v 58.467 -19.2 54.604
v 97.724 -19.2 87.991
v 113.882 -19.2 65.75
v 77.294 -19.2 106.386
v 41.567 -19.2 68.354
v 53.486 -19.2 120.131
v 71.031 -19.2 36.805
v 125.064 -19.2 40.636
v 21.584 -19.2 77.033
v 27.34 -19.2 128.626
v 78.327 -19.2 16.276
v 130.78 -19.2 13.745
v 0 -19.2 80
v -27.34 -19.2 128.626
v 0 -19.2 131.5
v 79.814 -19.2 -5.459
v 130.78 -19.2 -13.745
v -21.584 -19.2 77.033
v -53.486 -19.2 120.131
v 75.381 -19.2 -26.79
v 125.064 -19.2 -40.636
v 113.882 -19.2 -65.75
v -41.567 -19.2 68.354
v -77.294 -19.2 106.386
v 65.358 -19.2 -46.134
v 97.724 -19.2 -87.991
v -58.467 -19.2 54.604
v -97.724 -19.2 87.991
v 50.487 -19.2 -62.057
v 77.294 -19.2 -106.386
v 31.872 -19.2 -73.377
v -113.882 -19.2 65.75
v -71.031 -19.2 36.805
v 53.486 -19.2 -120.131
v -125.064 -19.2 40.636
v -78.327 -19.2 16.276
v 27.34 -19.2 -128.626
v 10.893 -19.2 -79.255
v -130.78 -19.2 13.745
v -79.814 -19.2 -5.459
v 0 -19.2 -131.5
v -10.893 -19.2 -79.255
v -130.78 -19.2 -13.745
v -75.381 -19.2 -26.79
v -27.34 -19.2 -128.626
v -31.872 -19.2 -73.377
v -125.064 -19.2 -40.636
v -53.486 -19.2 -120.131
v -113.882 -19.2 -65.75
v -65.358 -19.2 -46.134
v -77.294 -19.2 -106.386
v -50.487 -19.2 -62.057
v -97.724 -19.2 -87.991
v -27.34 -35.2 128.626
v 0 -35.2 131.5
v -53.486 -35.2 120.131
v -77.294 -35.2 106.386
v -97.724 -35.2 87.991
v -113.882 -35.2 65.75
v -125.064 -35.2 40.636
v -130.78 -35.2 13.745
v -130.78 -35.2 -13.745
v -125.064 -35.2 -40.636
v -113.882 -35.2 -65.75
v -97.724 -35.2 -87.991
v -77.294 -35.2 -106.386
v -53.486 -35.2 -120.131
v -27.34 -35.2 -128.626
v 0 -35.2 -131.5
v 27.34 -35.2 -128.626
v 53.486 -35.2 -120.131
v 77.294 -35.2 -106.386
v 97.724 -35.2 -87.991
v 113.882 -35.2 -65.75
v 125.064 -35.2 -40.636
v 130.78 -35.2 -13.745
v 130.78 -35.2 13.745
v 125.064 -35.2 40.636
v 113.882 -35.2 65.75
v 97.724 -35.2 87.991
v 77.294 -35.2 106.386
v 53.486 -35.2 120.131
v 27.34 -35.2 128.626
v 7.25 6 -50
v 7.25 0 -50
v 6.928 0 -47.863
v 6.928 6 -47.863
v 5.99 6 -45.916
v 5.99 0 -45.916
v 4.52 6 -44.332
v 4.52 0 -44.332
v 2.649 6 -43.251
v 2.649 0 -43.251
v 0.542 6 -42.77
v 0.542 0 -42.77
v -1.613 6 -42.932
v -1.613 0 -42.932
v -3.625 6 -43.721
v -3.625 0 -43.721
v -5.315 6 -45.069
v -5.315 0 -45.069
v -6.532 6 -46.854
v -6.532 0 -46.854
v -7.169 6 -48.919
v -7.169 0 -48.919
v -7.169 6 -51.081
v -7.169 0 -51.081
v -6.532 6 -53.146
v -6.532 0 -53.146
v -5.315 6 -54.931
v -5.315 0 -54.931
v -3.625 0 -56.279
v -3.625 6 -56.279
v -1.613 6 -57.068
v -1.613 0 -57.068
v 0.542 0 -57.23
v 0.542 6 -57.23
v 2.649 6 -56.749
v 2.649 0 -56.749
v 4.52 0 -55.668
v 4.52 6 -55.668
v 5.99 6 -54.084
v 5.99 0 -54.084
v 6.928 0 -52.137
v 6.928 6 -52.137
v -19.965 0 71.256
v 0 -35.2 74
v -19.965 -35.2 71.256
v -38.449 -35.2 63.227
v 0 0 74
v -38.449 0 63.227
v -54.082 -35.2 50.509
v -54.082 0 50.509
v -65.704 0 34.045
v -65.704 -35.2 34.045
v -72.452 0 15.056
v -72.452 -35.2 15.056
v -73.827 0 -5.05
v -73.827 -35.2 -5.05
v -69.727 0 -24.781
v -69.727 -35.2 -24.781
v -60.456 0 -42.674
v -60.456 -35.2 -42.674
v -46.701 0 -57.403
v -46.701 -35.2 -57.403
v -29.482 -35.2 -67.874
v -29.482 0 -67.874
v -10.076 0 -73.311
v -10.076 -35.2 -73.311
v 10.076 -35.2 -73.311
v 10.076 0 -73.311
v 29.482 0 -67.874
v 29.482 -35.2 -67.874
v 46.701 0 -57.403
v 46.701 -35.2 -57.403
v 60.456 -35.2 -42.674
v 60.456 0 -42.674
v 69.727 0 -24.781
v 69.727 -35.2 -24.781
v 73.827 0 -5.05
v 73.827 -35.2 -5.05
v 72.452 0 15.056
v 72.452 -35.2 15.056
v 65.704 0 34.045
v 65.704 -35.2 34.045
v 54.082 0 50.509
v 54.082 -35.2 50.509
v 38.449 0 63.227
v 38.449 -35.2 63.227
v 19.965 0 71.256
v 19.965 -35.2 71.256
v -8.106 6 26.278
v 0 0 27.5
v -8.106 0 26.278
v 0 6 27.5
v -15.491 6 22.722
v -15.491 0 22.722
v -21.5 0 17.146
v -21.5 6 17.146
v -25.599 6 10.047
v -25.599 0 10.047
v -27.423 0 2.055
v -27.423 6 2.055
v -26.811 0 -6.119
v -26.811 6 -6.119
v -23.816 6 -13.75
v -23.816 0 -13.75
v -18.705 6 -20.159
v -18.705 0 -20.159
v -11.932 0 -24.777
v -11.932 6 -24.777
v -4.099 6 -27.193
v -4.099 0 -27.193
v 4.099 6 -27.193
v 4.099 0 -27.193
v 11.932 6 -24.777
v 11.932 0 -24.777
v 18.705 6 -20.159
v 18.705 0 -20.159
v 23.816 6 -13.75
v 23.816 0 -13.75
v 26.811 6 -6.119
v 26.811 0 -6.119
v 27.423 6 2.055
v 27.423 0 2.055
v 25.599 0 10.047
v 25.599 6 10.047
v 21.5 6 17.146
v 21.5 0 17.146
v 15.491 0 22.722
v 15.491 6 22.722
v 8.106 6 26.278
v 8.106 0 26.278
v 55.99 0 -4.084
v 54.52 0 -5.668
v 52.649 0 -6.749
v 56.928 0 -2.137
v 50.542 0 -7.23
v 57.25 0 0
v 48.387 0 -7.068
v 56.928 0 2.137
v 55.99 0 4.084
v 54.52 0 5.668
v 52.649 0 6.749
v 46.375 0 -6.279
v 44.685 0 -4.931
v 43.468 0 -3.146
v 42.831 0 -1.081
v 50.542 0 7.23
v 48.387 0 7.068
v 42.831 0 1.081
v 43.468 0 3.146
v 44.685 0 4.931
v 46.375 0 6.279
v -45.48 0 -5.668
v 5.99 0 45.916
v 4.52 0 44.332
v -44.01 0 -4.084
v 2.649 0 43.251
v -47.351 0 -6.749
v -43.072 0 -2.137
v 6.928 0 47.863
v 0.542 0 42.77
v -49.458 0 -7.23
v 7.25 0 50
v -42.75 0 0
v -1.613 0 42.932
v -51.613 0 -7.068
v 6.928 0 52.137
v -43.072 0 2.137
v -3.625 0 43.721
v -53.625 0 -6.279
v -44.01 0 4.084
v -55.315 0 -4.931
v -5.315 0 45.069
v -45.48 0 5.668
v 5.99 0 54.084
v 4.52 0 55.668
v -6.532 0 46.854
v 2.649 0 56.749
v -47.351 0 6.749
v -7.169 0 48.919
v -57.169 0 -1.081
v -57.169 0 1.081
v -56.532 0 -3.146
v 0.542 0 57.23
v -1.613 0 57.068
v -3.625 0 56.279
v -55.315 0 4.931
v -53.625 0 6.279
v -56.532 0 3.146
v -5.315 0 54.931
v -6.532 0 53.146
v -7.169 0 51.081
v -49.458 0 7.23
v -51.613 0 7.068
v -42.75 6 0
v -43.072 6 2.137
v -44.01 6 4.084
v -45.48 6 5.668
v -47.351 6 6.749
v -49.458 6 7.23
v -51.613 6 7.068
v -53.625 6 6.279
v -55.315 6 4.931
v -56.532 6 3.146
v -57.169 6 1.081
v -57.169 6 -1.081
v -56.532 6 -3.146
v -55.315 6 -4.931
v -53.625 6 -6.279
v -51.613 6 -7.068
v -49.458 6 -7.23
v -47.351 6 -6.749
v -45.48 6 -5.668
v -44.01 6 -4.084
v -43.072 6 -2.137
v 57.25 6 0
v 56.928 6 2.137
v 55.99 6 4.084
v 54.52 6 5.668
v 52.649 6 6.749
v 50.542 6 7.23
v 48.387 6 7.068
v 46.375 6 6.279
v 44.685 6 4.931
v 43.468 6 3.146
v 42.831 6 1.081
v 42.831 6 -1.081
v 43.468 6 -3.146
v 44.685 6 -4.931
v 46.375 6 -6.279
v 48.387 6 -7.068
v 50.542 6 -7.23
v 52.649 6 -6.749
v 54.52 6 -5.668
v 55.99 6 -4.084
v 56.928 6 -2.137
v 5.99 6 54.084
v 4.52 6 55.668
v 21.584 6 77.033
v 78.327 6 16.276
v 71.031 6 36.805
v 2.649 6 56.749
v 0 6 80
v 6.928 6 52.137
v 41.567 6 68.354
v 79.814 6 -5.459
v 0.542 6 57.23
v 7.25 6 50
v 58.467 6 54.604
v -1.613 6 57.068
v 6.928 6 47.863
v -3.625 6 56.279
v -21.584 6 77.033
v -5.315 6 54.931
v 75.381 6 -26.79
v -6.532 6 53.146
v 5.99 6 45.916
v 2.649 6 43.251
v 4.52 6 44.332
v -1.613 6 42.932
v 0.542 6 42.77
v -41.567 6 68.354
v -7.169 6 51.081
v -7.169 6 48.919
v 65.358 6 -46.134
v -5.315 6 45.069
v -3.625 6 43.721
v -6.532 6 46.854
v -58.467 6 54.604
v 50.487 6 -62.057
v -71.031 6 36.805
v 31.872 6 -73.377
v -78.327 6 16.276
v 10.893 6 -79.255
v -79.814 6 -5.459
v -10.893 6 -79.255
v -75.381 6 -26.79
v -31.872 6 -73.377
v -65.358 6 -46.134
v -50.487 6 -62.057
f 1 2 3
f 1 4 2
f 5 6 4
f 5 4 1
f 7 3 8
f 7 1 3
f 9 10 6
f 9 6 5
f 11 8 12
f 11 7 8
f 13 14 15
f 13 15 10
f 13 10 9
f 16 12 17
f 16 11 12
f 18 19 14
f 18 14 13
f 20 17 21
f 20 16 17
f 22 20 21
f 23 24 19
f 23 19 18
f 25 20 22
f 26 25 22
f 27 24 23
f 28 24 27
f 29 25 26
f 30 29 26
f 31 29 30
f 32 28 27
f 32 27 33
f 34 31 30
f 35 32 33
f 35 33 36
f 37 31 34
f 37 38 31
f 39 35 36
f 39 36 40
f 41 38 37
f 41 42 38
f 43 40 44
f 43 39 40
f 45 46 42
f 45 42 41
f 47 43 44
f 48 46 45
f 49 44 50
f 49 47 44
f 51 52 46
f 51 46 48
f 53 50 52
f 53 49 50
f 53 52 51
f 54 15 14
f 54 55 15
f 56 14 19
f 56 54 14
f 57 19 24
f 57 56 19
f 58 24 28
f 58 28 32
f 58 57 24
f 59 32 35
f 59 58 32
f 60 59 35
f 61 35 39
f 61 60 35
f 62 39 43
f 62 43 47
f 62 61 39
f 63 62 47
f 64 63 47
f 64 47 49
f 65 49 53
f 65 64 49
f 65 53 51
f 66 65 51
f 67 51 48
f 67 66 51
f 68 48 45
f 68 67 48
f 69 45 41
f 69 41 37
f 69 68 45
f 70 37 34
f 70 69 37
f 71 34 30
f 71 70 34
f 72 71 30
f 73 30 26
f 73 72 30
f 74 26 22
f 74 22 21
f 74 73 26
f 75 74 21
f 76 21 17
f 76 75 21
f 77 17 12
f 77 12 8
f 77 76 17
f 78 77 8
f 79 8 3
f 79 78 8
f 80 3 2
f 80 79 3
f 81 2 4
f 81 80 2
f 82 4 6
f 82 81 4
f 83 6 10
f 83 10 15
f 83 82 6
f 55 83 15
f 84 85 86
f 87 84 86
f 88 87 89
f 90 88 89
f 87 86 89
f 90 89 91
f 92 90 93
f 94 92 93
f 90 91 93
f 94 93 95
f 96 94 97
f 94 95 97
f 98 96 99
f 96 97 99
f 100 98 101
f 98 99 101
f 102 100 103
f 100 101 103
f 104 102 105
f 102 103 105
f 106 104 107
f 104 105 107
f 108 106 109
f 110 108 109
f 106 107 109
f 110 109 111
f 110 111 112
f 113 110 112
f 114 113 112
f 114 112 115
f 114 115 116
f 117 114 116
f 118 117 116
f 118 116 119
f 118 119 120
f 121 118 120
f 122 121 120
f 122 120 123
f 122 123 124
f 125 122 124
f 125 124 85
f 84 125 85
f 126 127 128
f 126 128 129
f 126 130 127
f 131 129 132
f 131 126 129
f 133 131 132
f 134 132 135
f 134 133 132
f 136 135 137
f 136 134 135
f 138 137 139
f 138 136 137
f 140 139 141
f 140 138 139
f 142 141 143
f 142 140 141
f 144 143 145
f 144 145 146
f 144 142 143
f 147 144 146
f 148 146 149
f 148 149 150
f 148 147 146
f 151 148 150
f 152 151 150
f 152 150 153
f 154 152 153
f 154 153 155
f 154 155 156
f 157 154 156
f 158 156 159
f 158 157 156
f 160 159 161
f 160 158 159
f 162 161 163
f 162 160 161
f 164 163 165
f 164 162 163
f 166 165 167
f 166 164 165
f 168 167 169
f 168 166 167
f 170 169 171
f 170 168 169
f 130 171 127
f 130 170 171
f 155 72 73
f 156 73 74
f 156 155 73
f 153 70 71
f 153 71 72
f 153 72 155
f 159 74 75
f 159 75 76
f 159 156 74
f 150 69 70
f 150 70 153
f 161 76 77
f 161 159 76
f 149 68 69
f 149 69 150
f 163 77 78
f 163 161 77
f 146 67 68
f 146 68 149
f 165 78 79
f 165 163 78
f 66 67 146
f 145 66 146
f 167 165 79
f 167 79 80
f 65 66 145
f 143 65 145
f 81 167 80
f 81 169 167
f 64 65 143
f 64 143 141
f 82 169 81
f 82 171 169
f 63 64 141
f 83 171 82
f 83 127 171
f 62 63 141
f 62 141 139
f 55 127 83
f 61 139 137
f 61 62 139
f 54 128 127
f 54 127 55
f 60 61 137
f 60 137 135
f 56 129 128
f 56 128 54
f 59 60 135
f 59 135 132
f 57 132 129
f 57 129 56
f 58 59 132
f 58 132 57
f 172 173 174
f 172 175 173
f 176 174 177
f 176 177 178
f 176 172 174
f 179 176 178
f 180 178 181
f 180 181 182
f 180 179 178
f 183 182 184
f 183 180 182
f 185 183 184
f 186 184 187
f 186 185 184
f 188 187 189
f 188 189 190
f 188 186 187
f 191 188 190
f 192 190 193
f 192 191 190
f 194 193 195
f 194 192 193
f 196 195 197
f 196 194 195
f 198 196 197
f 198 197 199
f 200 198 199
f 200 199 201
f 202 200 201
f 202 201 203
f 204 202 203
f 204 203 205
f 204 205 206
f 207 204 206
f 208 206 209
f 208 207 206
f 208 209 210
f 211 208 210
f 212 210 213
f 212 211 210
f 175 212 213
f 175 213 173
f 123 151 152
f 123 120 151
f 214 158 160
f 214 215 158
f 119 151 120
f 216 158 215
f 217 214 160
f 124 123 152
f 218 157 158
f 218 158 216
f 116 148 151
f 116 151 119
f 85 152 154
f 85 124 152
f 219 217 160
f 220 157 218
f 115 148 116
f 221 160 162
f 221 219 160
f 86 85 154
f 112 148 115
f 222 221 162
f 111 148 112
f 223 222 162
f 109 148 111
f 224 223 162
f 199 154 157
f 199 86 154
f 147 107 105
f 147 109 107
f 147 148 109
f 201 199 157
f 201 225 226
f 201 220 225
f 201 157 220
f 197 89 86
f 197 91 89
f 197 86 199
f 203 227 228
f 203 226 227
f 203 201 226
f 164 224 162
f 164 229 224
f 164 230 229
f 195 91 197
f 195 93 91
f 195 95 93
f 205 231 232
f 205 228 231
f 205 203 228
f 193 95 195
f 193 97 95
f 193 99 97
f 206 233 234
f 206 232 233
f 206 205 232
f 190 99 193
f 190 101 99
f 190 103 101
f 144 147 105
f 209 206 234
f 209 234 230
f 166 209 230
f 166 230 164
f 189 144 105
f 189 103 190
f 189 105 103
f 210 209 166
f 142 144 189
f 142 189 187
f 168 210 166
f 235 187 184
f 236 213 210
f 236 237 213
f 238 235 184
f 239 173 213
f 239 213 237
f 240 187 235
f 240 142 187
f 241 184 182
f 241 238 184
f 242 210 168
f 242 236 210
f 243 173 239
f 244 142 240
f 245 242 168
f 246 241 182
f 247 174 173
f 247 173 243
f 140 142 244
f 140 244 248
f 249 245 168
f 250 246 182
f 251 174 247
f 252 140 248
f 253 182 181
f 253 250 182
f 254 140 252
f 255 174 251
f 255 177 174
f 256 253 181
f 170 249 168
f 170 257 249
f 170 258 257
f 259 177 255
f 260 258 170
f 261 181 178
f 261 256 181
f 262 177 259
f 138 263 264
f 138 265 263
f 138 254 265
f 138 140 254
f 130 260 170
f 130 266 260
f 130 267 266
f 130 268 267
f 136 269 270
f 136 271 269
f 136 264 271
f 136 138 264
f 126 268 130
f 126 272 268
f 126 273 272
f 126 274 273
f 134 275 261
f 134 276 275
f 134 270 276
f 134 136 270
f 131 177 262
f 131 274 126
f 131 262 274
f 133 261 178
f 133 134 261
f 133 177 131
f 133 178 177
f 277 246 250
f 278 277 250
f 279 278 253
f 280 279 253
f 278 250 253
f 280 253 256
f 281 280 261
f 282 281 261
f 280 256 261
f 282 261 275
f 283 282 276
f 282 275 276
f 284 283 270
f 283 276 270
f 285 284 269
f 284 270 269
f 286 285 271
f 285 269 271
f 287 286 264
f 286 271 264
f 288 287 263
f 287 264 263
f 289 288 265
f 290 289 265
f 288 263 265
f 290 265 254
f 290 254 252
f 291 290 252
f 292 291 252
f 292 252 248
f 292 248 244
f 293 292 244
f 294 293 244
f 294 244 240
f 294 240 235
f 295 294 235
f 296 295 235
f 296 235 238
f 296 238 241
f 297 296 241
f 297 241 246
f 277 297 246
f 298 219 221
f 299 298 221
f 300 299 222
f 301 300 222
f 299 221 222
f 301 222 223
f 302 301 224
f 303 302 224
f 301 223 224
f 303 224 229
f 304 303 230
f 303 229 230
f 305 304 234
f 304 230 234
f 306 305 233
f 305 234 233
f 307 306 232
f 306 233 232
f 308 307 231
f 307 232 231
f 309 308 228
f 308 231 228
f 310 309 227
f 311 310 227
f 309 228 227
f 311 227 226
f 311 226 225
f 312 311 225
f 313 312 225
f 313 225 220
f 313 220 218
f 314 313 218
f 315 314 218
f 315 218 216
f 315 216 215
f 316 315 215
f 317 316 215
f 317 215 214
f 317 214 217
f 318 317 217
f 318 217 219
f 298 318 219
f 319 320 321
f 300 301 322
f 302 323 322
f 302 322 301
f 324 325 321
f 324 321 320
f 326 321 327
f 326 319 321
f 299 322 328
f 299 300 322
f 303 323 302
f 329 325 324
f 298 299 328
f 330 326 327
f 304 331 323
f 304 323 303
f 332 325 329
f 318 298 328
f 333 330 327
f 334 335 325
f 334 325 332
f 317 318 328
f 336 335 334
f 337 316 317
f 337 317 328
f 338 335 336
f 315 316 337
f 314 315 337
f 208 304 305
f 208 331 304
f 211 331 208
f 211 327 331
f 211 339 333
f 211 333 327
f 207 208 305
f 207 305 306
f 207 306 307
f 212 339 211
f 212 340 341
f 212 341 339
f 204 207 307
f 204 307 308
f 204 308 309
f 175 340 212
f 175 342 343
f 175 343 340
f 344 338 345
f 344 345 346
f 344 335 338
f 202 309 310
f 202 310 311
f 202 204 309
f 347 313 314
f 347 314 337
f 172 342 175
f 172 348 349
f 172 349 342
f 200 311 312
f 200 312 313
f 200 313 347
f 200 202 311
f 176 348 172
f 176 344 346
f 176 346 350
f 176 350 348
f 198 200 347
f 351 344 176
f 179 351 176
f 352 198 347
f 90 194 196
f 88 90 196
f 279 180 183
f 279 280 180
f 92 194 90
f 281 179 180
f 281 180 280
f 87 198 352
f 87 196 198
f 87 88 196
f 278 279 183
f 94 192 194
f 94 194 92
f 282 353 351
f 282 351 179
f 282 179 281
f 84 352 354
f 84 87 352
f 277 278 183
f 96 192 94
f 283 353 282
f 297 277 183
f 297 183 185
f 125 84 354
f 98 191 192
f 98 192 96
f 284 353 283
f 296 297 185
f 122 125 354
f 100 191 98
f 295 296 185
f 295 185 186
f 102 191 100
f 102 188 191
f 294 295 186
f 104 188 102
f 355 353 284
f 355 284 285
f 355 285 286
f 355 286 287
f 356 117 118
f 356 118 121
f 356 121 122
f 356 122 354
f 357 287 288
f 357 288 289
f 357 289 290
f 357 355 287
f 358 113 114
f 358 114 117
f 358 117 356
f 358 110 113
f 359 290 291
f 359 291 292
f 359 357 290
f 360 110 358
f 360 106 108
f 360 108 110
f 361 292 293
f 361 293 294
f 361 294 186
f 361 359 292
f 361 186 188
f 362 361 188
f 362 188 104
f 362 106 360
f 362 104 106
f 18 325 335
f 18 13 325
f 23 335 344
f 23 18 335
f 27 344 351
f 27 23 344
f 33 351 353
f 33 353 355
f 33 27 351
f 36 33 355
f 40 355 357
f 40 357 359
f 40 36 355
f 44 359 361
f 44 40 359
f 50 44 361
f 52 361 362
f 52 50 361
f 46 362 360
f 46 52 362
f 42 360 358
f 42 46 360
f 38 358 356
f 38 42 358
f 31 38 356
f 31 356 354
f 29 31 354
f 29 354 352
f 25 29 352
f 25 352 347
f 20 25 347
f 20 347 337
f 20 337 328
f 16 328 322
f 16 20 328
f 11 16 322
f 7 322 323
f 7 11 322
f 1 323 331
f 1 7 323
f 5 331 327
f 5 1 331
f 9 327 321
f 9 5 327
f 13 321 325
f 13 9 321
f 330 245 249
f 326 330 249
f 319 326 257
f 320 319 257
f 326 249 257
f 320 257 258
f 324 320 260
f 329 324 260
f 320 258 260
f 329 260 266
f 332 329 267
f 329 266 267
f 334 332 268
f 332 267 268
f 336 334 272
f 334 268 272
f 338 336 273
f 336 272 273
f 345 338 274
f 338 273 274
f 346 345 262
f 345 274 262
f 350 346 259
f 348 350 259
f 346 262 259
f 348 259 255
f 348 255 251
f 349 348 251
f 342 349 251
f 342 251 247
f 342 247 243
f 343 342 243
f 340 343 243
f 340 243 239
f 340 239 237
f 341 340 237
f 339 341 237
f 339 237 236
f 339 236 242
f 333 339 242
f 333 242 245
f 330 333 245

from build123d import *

# Parameters (mm, degrees)
F3_D = 14.5


with BuildPart() as f1:
    # F0 (on Right) → F1 (revolve)
    with BuildSketch(Plane.YZ):
        Polygon((0, 74), (0, 27.5), (6, 27.5), (6, 80), (-19.2, 80), (-19.2, 131.5), (-35.2, 131.5), (-35.2, 74), align=None)
    revolve(axis=Axis((0, -66.1122447776, 0), (0, -1, 0)))

    # F3 (through all)
    with Locations(Plane(origin=(0, 6, 0), x_dir=(-1, 0, 0), z_dir=(0, 1, 0))):
        with Locations((0, 50), (50, 0), (0, -50), (-50, 0)):
            Hole(F3_D / 2)


solid = f1.part
